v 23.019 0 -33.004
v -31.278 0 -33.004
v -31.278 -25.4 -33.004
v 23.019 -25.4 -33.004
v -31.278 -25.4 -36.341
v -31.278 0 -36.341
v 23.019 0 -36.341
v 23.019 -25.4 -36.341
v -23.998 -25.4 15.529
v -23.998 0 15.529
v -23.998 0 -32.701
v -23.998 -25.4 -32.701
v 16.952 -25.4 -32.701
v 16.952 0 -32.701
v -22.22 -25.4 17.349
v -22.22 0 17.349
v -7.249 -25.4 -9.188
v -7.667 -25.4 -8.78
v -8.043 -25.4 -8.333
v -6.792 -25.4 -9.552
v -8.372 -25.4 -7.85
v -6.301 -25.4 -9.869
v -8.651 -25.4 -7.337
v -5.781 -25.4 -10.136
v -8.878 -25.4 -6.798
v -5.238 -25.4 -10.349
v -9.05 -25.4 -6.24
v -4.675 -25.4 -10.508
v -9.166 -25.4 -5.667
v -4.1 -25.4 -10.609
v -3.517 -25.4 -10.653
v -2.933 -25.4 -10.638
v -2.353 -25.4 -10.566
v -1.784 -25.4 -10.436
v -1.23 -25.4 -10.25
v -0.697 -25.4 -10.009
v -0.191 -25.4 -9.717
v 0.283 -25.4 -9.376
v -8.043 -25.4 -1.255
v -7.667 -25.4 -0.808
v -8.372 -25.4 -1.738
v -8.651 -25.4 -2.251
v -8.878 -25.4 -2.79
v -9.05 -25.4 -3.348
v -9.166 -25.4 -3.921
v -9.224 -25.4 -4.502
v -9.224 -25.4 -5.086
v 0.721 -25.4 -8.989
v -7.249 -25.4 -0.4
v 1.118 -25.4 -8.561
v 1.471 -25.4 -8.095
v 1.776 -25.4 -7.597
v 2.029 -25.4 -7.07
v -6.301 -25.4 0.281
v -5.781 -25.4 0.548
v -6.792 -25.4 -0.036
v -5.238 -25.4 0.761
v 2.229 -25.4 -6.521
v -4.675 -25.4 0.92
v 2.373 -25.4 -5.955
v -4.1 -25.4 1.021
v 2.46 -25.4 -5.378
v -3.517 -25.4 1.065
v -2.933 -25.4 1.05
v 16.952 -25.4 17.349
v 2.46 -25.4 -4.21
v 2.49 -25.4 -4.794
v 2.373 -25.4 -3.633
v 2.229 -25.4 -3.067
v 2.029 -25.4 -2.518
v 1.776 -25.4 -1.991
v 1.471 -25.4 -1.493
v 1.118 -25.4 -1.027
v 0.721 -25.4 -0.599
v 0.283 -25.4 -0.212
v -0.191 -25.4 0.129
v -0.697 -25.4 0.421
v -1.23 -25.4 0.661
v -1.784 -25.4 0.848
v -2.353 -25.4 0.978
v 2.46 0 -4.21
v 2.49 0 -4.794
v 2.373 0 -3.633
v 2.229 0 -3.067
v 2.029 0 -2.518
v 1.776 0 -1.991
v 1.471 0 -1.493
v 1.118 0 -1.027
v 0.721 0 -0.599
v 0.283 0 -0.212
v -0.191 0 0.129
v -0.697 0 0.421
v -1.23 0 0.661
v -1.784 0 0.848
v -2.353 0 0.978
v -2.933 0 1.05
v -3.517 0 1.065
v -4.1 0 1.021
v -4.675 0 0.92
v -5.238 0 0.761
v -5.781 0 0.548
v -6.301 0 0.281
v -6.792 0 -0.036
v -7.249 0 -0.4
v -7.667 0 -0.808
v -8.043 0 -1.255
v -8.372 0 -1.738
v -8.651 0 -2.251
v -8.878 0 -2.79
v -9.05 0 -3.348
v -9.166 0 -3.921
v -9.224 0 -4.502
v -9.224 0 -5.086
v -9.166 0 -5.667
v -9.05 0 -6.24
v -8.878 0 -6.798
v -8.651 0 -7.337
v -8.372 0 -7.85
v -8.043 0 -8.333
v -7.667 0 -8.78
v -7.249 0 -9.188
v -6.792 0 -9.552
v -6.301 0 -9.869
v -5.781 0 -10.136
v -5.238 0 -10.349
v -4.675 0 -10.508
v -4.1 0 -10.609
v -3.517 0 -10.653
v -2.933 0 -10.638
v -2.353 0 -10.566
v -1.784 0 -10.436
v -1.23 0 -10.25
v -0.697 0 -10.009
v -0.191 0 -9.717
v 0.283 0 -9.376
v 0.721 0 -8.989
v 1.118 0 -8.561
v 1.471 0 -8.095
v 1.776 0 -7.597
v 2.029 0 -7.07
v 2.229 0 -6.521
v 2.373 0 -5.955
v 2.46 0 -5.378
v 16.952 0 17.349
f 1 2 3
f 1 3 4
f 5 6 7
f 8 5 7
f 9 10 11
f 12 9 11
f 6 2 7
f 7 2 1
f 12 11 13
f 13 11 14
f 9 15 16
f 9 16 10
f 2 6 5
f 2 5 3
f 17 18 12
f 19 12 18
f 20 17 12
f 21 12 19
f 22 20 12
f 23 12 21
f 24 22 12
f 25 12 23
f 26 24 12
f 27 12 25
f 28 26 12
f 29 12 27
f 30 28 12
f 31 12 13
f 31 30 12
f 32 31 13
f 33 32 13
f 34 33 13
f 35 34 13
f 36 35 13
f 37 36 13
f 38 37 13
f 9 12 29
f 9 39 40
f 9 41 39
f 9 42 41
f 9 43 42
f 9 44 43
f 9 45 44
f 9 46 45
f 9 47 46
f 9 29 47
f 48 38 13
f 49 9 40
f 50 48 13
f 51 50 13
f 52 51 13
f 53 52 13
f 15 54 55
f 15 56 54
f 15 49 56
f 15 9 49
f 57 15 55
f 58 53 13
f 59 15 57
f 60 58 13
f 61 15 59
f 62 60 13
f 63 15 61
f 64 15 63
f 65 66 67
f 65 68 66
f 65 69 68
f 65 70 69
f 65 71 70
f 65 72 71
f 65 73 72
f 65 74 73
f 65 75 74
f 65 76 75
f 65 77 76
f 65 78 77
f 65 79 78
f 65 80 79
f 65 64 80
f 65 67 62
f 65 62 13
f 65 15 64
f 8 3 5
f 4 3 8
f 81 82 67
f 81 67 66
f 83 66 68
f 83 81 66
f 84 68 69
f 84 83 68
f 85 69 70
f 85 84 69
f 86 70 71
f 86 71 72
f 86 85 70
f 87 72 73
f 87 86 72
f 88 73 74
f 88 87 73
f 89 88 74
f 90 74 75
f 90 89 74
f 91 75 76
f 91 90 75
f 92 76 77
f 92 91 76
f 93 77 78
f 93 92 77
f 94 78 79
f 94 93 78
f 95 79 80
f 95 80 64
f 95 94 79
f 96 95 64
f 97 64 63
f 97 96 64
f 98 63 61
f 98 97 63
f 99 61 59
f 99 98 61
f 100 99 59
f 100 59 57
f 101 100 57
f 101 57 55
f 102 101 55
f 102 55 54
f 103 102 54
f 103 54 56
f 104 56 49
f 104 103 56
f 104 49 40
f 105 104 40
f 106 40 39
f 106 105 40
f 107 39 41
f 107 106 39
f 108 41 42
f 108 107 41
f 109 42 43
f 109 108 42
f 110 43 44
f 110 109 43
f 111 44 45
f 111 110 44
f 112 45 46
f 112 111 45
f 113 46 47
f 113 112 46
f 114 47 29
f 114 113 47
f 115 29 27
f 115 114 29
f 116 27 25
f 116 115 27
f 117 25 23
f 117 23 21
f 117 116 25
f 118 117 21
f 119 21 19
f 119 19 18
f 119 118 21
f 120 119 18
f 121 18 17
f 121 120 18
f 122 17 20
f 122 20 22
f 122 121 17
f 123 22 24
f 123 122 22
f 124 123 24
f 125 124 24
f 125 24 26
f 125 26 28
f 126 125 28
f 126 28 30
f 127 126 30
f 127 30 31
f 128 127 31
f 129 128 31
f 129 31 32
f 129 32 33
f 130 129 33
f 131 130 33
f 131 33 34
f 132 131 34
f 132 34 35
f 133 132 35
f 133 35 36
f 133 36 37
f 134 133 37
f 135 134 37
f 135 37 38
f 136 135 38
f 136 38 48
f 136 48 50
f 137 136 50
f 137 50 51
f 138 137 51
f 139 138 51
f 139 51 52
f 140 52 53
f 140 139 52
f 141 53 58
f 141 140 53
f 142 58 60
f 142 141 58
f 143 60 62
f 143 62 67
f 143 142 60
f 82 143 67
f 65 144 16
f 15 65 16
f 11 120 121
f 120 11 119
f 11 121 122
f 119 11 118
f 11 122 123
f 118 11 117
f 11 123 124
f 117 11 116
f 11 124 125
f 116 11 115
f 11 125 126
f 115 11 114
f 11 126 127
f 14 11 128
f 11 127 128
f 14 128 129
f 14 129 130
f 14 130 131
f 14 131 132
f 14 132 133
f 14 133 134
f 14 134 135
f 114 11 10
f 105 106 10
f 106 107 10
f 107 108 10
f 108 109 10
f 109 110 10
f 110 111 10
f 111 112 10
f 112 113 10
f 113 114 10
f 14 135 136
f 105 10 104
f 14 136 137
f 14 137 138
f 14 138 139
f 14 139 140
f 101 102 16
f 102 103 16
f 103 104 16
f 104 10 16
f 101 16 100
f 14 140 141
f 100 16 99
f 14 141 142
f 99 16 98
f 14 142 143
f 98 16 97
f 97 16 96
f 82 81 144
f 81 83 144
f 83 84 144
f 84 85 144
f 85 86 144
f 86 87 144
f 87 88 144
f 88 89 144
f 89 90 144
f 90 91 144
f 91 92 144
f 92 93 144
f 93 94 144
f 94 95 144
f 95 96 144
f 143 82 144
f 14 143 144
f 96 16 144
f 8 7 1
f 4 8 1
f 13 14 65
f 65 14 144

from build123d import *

# Parameters (mm, degrees)
F0_W     = 54.296478
F0_H     = 3.336653
F0_R     = 1.845098
F0_R_2   = 5.860604
F1_DEPTH = 25.4


with BuildPart() as f1:
    # F0 (on Front) → F1 (new body)
    with BuildSketch(Plane.XZ):
        with Locations((-4.129395, -34.672249)):
            Rectangle(F0_W, F0_H)
        Polygon((16.952196, 17.349238), (-22.219523, 17.349238), (-23.997659, 15.528656), (-23.997659, -32.700587), (16.952196, -32.700587), align=None)
        with Locations((-3.674396, -25.723945)):
            Circle(F0_R, mode=Mode.SUBTRACT)
        with Locations((-3.371064, -4.794018)):
            Circle(F0_R_2, mode=Mode.SUBTRACT)
        with Locations((-3.674396, -25.723945)):
            Circle(F0_R)
    extrude(amount=F1_DEPTH)


solid = f1.part
